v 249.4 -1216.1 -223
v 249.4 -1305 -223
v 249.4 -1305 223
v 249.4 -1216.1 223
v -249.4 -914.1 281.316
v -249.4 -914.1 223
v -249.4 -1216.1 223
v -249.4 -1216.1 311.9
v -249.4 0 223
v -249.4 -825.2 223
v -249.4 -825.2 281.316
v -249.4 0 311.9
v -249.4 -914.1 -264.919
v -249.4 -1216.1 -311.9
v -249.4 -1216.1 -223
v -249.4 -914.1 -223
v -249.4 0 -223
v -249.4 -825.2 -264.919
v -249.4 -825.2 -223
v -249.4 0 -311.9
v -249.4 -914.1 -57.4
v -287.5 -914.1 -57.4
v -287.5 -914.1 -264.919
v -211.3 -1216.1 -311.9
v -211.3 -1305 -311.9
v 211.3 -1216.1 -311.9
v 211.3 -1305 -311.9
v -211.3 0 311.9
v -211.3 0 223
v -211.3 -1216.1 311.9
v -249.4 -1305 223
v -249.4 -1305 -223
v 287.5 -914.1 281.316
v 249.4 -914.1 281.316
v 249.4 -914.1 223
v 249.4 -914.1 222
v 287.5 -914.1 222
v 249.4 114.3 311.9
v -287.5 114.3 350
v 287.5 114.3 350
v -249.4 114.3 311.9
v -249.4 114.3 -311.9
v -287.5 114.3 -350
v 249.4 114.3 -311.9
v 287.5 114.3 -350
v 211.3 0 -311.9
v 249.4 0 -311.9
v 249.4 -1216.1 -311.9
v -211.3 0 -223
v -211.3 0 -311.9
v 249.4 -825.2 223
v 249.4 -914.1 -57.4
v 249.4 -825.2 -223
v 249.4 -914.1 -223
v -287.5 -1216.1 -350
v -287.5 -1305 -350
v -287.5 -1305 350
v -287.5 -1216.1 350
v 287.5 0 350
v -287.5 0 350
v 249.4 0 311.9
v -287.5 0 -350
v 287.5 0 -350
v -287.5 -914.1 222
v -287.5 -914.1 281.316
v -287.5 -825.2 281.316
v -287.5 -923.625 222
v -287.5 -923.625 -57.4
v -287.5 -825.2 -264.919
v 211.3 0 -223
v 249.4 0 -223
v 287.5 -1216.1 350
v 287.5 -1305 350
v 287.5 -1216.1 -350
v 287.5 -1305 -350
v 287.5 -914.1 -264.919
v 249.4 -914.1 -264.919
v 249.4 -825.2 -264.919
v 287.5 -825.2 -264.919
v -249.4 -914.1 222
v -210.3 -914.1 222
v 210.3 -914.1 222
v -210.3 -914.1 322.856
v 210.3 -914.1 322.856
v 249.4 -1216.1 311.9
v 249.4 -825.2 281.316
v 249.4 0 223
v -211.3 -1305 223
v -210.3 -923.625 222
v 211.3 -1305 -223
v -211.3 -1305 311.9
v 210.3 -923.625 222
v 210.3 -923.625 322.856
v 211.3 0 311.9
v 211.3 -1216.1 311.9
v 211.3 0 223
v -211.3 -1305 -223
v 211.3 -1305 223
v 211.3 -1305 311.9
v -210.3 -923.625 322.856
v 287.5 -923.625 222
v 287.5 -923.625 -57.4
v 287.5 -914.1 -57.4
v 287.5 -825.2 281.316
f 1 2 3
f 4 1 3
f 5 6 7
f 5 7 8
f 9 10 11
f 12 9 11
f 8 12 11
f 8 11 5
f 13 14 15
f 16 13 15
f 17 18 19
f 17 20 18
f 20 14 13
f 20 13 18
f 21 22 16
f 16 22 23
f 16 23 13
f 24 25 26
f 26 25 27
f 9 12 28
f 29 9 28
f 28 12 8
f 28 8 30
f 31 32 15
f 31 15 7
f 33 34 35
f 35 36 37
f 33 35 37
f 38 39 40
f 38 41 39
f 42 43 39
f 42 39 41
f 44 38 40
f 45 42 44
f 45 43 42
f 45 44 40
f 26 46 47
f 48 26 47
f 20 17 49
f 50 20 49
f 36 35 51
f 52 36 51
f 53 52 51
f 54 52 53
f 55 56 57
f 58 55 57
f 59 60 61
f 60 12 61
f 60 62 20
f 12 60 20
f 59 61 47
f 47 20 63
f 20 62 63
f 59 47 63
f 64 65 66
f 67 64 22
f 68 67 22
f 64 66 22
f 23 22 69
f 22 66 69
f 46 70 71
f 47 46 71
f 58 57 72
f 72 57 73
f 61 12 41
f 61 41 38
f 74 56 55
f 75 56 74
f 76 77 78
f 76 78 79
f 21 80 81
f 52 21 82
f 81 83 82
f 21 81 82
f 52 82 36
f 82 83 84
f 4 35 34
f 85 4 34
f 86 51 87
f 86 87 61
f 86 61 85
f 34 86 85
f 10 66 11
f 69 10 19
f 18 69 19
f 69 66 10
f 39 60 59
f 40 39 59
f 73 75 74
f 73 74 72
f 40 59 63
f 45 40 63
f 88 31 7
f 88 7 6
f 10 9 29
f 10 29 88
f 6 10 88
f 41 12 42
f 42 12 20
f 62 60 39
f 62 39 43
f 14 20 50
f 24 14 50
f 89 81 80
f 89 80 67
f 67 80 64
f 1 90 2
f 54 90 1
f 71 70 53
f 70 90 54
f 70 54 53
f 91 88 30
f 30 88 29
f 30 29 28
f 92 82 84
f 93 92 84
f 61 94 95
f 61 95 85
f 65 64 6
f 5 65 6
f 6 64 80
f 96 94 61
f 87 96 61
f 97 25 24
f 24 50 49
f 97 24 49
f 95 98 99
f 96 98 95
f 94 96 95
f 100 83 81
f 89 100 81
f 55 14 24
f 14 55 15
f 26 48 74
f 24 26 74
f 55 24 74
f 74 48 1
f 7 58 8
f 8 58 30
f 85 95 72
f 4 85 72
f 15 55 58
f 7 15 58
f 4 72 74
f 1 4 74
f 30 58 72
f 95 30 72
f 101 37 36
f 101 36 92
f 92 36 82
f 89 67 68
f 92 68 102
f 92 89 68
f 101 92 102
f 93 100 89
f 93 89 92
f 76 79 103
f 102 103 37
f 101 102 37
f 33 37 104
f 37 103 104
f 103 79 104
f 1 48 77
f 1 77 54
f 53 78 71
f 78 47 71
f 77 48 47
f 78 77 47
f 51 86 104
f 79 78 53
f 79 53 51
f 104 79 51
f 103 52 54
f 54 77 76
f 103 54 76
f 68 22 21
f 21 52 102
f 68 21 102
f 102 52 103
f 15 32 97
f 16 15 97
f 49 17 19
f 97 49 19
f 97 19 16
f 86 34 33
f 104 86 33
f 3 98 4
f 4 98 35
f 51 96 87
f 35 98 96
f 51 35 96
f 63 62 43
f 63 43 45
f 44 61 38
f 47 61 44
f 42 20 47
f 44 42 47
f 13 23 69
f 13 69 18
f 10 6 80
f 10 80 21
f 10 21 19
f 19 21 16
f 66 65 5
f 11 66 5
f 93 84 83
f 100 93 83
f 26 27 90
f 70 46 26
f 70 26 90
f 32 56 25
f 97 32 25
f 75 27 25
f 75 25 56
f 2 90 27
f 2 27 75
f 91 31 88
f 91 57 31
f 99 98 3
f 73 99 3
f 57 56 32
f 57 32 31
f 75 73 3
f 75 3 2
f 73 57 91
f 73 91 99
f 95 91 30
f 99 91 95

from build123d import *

# Parameters (mm, degrees)
SKETCH1_W             = 575
SKETCH1_H             = 700
SKETCH1_W_2           = 498.8
SKETCH1_H_2           = 623.8
BOSS_EXTRUDE1_DEPTH   = 114.3
SKETCH2_W             = 38.1
SKETCH2_H             = 88.9
BOSS_EXTRUDE2_DEPTH   = 1305
BOSS_EXTRUDE2_2_DEPTH = 1305
BOSS_EXTRUDE2_3_DEPTH = 1305
BOSS_EXTRUDE2_4_DEPTH = 1305
SKETCH3_W             = 575
SKETCH3_H             = 700
SKETCH3_W_2           = 498.8
SKETCH3_H_2           = 623.8
BOSS_EXTRUDE3_DEPTH   = 88.9
SKETCH7_W             = 38.1
SKETCH7_H             = 546.2345493
BOSS_EXTRUDE4_DEPTH   = 88.9
BOSS_EXTRUDE8_DEPTH   = 9.525


with BuildPart() as part:
    # Sketch1 → Boss-Extrude1 (new body)
    with BuildSketch(Plane(origin=(0, 0, 0), x_dir=(1, 0, 0), z_dir=(0, 1, 0))):
        Rectangle(SKETCH1_W, SKETCH1_H)
        Rectangle(SKETCH1_W_2, SKETCH1_H_2, mode=Mode.SUBTRACT)
    extrude(amount=BOSS_EXTRUDE1_DEPTH)


with BuildPart() as body_2:
    # Sketch2 → Boss-Extrude2 (new body)
    with BuildSketch(Plane.XZ):
        with Locations((-230.35, 267.45)):
            Rectangle(SKETCH2_W, SKETCH2_H)
    extrude(amount=BOSS_EXTRUDE2_DEPTH)



with BuildPart() as body_3:
    # Sketch2 → Boss-Extrude2 2 (new body)
    with BuildSketch(Plane.XZ):
        with Locations((-230.35, -267.45)):
            Rectangle(SKETCH2_W, SKETCH2_H)
    extrude(amount=BOSS_EXTRUDE2_2_DEPTH)


with BuildPart() as body_4:
    # Sketch2 → Boss-Extrude2 3 (new body)
    with BuildSketch(Plane.XZ):
        with Locations((230.35, 267.45)):
            Rectangle(SKETCH2_W, SKETCH2_H)
    extrude(amount=BOSS_EXTRUDE2_3_DEPTH)


with BuildPart() as body_5:
    # Sketch2 → Boss-Extrude2 4 (new body)
    with BuildSketch(Plane.XZ):
        with Locations((230.35, -267.45)):
            Rectangle(SKETCH2_W, SKETCH2_H)
    extrude(amount=BOSS_EXTRUDE2_4_DEPTH)


with BuildPart() as body_2_1:
    add(body_2.part)

    add(body_3.part)  # Boss-Extrude3 merges body 3

    add(body_4.part)  # Boss-Extrude3 merges body 4

    add(body_5.part)  # Boss-Extrude3 merges body 5
    # Sketch3 → Boss-Extrude3 (add)
    with BuildSketch(Plane.XZ.offset(1305)):
        Rectangle(SKETCH3_W, SKETCH3_H)
        Rectangle(SKETCH3_W_2, SKETCH3_H_2, mode=Mode.SUBTRACT)
    extrude(amount=-BOSS_EXTRUDE3_DEPTH)

    # Sketch7 → Boss-Extrude4 (add)
    with BuildSketch(Plane(origin=(0, -914.1, 0), x_dir=(1, 0, 0), z_dir=(0, 1, 0))):
        with Locations((-268.45, -8.198642391)):
            Rectangle(SKETCH7_W, SKETCH7_H)
        with Locations((268.45, -8.198642391)):
            Rectangle(SKETCH7_W, SKETCH7_H)
    extrude(amount=BOSS_EXTRUDE4_DEPTH)

    # Sketch8 → Boss-Extrude8 (add)
    with BuildSketch(Plane.XZ.offset(914.1)):
        Polygon((-287.5, 222), (-287.5, -57.4), (287.5, -57.4), (287.5, 222), (210.3, 222), (210.3, 322.85640623), (-210.3, 322.85640623), (-210.3, 222), align=None)
    extrude(amount=BOSS_EXTRUDE8_DEPTH)


solid = Compound([part.part, body_2_1.part])
